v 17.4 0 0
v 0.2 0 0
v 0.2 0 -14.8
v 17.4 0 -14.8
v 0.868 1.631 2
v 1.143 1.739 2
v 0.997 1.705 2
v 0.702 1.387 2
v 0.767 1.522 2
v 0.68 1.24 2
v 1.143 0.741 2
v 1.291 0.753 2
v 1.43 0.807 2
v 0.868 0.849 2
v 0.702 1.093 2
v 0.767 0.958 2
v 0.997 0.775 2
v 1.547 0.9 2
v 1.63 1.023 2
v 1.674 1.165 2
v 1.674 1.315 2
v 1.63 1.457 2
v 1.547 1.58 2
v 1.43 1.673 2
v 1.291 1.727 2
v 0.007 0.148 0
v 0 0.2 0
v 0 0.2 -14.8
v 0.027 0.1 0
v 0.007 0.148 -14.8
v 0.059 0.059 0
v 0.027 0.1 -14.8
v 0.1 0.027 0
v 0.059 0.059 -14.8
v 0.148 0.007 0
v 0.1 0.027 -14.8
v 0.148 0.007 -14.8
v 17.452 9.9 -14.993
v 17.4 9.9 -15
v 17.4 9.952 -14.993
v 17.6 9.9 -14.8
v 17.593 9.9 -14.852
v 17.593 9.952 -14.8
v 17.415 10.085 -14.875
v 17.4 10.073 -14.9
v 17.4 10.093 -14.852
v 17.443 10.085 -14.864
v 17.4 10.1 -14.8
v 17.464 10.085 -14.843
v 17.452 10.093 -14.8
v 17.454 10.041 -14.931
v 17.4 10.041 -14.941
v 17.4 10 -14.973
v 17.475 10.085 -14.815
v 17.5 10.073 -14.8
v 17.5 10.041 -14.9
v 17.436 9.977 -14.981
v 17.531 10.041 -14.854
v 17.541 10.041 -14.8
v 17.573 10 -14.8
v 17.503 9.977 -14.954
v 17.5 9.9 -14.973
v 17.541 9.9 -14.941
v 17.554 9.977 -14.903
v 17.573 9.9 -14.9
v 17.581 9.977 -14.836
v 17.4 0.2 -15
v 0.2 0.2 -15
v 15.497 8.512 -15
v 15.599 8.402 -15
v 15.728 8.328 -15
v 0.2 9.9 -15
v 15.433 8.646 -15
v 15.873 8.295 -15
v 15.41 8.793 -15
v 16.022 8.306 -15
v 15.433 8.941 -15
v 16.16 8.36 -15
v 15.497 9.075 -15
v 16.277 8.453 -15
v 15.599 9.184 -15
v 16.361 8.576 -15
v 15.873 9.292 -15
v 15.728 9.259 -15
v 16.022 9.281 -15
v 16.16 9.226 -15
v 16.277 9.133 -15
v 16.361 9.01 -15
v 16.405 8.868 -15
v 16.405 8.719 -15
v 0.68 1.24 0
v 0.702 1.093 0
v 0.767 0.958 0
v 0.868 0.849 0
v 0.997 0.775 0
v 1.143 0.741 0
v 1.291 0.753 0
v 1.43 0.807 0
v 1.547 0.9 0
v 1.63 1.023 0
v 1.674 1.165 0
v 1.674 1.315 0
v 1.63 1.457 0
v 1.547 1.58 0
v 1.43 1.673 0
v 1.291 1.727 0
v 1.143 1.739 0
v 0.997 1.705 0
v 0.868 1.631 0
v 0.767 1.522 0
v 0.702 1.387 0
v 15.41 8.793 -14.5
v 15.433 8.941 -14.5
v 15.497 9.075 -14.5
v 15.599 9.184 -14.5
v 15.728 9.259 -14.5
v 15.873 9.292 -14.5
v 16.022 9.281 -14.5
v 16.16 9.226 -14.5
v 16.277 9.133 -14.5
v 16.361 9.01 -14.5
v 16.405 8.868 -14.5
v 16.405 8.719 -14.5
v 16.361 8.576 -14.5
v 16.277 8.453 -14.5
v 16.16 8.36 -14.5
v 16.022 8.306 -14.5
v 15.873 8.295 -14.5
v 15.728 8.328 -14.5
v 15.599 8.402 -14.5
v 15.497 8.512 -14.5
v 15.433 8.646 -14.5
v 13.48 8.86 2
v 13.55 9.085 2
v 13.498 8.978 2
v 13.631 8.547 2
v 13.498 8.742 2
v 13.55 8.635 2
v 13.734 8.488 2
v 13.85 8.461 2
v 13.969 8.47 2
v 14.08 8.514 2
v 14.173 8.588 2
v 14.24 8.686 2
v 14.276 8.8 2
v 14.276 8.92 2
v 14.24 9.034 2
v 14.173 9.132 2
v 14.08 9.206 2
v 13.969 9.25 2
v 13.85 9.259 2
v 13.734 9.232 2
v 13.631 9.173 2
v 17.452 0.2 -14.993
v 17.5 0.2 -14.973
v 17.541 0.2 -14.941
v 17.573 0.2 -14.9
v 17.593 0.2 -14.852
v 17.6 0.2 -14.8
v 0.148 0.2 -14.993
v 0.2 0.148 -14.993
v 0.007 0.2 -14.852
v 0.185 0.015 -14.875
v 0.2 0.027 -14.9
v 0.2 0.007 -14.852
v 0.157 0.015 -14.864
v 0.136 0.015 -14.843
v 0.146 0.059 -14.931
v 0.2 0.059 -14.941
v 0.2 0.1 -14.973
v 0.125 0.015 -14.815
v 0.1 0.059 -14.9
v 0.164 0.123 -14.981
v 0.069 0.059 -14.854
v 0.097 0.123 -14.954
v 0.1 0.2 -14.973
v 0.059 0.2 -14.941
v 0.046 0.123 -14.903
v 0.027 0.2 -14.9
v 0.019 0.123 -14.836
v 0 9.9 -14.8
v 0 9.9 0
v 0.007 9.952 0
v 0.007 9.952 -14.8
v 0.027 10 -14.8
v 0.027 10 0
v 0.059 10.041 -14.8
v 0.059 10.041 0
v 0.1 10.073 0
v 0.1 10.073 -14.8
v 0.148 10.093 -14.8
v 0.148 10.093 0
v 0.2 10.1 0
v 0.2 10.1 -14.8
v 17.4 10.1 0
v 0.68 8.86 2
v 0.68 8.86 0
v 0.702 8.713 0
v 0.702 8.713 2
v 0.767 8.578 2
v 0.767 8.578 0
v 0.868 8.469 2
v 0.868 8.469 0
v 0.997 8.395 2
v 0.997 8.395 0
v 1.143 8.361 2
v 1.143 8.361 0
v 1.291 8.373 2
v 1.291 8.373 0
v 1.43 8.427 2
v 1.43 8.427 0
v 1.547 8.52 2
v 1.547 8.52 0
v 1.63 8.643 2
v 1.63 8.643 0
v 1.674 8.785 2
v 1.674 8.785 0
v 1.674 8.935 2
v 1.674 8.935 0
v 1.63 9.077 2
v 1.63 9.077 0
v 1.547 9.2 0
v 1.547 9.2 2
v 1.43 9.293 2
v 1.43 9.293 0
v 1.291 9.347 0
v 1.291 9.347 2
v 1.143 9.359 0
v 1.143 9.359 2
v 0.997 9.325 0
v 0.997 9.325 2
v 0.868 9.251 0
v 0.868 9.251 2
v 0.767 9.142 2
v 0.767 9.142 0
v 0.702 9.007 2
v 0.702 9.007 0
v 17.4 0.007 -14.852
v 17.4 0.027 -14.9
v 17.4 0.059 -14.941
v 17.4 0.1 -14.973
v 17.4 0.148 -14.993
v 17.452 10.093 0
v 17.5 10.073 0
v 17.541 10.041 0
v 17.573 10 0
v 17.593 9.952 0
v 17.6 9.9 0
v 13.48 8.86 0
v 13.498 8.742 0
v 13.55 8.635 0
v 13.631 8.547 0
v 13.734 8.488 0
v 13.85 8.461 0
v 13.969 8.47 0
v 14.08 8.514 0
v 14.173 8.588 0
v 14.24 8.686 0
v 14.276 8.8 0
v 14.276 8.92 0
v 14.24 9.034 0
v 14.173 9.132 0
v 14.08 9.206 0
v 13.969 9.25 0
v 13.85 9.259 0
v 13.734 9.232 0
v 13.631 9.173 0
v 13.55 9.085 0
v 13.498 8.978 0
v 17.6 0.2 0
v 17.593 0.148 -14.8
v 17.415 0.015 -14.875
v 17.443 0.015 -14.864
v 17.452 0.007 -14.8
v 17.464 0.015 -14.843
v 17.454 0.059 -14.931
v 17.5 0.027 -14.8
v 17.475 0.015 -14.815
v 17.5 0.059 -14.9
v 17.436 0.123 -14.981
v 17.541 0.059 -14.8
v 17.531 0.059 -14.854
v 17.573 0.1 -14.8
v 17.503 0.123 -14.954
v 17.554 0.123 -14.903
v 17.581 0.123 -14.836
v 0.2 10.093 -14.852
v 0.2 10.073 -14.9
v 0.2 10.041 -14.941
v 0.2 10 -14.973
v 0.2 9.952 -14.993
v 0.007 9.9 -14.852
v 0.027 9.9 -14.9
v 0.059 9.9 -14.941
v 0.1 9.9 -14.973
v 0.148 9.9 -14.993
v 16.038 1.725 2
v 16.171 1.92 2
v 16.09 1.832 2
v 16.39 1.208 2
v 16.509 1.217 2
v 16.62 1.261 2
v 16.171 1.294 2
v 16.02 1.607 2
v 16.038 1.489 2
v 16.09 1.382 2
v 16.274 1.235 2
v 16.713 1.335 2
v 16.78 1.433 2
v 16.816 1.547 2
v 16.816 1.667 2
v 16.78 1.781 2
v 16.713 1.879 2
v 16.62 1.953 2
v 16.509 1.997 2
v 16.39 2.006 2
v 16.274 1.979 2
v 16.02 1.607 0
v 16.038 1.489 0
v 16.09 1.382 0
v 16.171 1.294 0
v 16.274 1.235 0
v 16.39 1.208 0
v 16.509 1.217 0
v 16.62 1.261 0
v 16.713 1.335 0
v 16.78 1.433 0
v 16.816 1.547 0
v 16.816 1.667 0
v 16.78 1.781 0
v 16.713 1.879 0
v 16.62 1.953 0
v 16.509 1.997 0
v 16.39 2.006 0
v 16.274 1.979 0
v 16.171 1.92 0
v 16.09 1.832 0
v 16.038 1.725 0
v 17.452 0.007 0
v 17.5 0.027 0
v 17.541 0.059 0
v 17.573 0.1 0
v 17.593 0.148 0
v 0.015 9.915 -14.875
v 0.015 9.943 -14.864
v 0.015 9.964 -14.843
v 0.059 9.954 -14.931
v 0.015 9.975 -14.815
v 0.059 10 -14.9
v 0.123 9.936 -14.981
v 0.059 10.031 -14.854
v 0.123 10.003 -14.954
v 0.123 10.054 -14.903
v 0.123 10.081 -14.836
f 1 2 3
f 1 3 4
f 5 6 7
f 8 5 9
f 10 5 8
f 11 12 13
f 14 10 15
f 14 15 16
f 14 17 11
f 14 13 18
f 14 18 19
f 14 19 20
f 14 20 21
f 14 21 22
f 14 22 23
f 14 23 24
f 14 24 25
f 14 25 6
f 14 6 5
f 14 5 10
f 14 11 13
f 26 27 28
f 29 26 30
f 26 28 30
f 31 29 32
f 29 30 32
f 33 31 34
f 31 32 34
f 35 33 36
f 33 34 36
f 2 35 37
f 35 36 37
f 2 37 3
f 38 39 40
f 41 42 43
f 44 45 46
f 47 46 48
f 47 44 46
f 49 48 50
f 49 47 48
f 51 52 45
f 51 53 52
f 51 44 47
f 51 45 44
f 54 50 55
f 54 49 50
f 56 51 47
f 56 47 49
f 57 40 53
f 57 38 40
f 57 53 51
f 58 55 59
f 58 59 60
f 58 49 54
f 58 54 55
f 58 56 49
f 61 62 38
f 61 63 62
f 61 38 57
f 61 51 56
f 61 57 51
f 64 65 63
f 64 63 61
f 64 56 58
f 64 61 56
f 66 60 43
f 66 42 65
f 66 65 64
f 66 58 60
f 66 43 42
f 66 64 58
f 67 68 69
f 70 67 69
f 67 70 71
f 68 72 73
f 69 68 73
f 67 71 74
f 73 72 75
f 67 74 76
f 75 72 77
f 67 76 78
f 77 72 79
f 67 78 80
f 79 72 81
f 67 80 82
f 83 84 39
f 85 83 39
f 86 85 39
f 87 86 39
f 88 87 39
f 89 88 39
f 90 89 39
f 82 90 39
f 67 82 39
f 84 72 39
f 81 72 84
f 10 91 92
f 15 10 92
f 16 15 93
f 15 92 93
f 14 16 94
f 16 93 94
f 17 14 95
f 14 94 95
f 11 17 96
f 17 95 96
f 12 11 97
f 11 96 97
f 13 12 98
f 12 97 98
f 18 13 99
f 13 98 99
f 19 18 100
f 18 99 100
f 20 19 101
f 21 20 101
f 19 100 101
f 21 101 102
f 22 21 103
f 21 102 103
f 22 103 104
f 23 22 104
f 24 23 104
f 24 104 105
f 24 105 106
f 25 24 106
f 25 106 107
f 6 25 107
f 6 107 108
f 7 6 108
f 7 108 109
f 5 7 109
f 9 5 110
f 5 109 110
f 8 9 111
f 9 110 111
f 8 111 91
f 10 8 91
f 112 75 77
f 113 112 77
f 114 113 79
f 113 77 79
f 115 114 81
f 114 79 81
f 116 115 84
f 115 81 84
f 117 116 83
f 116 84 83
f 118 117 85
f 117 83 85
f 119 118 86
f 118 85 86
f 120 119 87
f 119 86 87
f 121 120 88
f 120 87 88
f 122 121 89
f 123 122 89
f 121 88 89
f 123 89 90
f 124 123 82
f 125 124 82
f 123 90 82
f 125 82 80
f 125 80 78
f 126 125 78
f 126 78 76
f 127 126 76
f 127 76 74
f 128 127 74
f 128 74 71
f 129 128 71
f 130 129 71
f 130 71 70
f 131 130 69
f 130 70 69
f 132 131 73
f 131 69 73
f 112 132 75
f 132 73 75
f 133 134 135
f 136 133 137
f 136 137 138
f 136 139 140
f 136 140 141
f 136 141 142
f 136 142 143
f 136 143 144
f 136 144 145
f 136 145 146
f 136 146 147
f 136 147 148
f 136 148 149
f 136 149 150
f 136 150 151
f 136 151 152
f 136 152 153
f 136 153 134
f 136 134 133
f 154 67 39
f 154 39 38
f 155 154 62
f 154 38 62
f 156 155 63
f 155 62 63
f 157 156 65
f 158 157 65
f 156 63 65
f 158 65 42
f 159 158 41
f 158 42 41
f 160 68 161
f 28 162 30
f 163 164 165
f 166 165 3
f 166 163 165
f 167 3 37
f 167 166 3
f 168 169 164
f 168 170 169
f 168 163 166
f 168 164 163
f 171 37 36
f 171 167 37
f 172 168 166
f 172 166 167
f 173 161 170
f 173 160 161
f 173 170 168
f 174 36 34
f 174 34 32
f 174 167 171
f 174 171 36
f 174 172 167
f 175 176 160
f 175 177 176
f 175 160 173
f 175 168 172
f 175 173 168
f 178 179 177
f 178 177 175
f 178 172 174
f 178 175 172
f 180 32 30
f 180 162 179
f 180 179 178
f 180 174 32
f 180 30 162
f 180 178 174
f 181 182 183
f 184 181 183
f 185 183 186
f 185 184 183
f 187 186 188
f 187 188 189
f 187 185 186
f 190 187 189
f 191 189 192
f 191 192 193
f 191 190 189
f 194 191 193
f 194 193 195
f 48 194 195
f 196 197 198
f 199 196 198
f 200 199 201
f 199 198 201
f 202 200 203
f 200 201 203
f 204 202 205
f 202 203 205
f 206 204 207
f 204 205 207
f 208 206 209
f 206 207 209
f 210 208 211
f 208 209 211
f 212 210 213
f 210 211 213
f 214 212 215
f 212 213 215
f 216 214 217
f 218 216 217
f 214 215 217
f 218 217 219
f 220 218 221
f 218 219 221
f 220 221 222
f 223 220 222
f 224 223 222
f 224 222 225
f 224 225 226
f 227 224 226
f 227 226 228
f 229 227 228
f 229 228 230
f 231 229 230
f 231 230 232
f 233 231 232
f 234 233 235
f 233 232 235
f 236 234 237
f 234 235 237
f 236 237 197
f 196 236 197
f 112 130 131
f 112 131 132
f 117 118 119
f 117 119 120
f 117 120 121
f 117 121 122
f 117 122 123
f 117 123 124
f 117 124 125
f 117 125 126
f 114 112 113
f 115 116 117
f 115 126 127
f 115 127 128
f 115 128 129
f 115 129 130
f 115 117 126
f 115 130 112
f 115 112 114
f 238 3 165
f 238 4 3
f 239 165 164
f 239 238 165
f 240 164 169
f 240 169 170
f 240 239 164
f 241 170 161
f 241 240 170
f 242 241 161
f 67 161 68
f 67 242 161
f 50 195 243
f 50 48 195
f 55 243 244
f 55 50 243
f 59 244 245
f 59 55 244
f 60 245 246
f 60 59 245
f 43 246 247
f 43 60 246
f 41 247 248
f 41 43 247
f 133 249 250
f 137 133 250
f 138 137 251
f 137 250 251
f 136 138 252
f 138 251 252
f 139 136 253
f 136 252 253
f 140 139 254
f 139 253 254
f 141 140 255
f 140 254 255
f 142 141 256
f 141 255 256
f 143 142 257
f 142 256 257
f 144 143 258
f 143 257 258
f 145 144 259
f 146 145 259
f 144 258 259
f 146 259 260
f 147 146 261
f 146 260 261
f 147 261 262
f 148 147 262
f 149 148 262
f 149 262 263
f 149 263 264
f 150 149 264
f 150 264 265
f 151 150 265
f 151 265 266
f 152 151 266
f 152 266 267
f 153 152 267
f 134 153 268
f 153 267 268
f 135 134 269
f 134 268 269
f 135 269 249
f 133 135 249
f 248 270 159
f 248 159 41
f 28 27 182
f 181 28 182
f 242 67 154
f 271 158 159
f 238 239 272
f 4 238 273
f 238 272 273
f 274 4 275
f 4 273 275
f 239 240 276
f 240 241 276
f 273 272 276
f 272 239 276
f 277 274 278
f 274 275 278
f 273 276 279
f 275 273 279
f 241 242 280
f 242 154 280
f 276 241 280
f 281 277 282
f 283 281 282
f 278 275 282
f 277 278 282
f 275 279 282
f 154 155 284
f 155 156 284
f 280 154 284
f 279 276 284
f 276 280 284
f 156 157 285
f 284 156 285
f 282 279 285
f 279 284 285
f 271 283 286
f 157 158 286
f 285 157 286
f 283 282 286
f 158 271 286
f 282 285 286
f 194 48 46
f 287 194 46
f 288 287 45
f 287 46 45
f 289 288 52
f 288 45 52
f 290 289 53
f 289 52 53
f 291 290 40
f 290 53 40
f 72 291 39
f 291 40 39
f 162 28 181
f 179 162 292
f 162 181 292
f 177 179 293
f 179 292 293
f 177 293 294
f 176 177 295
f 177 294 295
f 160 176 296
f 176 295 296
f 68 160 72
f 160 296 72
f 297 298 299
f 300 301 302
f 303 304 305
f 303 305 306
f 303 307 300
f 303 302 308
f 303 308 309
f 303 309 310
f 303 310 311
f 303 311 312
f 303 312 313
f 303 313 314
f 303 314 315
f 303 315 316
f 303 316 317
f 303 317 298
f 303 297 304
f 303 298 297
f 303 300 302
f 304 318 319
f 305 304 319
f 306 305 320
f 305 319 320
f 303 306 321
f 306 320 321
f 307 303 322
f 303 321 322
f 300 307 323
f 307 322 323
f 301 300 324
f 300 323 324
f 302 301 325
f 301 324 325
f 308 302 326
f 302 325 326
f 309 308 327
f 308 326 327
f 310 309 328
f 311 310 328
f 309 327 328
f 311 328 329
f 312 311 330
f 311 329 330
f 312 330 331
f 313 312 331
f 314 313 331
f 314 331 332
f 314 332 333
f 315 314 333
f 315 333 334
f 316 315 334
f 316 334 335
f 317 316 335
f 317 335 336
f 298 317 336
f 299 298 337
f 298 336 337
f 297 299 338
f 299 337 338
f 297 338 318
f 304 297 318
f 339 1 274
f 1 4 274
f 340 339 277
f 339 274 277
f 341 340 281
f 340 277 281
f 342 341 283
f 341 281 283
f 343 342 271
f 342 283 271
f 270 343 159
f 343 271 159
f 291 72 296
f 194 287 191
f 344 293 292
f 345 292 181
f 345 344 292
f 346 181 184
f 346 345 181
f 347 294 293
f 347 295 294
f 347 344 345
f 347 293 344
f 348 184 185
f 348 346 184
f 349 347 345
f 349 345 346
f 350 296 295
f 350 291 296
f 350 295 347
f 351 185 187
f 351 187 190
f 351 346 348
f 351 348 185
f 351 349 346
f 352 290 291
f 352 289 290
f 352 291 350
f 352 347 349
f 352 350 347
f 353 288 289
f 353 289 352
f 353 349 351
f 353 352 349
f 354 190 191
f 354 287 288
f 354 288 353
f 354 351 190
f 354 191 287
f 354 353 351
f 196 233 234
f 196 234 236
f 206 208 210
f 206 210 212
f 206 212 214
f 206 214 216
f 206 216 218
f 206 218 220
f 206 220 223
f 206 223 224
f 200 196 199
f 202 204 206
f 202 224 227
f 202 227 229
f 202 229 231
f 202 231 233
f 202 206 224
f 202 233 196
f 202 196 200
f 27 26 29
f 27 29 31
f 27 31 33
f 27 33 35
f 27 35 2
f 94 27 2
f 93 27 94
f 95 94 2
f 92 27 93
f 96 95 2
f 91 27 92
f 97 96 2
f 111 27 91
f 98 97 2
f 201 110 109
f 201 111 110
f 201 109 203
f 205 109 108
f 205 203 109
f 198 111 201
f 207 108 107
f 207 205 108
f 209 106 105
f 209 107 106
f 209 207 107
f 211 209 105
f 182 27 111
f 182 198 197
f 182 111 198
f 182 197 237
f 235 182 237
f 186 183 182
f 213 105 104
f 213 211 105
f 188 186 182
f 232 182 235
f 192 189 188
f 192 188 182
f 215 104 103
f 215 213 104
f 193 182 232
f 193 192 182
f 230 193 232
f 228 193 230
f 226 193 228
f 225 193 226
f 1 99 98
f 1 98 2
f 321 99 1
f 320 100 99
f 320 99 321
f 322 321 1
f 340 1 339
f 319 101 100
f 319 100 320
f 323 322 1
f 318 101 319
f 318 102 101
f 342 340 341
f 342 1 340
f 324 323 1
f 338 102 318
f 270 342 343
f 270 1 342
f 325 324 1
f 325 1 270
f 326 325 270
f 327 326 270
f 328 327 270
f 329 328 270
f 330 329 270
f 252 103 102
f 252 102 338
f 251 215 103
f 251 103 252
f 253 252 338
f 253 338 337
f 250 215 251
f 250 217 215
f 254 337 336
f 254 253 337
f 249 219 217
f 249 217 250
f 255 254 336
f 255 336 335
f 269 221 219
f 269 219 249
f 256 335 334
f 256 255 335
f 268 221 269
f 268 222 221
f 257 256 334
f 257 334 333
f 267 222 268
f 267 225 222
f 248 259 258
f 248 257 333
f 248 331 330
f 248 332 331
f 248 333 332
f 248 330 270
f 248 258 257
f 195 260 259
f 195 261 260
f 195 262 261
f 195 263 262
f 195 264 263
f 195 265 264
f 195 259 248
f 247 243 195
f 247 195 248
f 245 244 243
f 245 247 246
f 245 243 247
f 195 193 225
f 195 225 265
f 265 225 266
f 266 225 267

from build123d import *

# Parameters (mm, degrees)
SKETCH_1_W          = 17.6
SKETCH_1_H          = 10.1
EXTRUDE_1_DEPTH     = 15
SKETCH_2_R          = 0.5
SKETCH_2_R_2        = 0.4
EXTRUDE_2_DEPTH     = 2
FILLET_1_R          = 0.2
SKETCH_3_R          = 0.5
CUT_EXTRUDE_1_DEPTH = 0.5


with BuildPart() as part:
    # 草图1 → 凸台-拉伸1 (new body)
    with BuildSketch(Plane.XY):
        with Locations((8.8, 5.05)):
            Rectangle(SKETCH_1_W, SKETCH_1_H)
    extrude(amount=-EXTRUDE_1_DEPTH)

    # 草图2 → 凸台-拉伸2 (add)
    with BuildSketch(Plane.XY):
        with Locations(Location((1.18, 8.86, 0), (0, 0, 180))):
            Circle(SKETCH_2_R)
        with Locations(Location((13.88, 8.86, 0), (0, 0, 180))):
            Circle(SKETCH_2_R_2)
        with Locations(Location((16.42, 1.606982533, 0), (0, 0, 180))):
            Circle(SKETCH_2_R_2)
        with Locations(Location((1.18, 1.24, 0), (0, 0, 180))):
            Circle(SKETCH_2_R)
    extrude(amount=EXTRUDE_2_DEPTH)

    # 圆角1
    fillet_1_edges = [part.edges().sort_by_distance(p)[0] for p in [
        (17.6, 5.05, -15),
        (8.8, 10.1, -15),
        (0, 5.05, -15),
        (8.8, 0, -15),
        (0, 10.1, -7.5),
        (17.6, 10.1, -7.5),
        (17.6, 0, -7.5),
        (0, 0, -7.5),
    ]]
    fillet(fillet_1_edges, radius=FILLET_1_R)

    # 草图3 → 切除-拉伸1 (cut)
    with BuildSketch(Plane(origin=(0, 0, -15), x_dir=(-1, 0, 0), z_dir=(0, 0, -1))):
        with Locations((-15.910317982, 8.793351903)):
            Circle(SKETCH_3_R)
    extrude(amount=-CUT_EXTRUDE_1_DEPTH, mode=Mode.SUBTRACT)


solid = part.part
